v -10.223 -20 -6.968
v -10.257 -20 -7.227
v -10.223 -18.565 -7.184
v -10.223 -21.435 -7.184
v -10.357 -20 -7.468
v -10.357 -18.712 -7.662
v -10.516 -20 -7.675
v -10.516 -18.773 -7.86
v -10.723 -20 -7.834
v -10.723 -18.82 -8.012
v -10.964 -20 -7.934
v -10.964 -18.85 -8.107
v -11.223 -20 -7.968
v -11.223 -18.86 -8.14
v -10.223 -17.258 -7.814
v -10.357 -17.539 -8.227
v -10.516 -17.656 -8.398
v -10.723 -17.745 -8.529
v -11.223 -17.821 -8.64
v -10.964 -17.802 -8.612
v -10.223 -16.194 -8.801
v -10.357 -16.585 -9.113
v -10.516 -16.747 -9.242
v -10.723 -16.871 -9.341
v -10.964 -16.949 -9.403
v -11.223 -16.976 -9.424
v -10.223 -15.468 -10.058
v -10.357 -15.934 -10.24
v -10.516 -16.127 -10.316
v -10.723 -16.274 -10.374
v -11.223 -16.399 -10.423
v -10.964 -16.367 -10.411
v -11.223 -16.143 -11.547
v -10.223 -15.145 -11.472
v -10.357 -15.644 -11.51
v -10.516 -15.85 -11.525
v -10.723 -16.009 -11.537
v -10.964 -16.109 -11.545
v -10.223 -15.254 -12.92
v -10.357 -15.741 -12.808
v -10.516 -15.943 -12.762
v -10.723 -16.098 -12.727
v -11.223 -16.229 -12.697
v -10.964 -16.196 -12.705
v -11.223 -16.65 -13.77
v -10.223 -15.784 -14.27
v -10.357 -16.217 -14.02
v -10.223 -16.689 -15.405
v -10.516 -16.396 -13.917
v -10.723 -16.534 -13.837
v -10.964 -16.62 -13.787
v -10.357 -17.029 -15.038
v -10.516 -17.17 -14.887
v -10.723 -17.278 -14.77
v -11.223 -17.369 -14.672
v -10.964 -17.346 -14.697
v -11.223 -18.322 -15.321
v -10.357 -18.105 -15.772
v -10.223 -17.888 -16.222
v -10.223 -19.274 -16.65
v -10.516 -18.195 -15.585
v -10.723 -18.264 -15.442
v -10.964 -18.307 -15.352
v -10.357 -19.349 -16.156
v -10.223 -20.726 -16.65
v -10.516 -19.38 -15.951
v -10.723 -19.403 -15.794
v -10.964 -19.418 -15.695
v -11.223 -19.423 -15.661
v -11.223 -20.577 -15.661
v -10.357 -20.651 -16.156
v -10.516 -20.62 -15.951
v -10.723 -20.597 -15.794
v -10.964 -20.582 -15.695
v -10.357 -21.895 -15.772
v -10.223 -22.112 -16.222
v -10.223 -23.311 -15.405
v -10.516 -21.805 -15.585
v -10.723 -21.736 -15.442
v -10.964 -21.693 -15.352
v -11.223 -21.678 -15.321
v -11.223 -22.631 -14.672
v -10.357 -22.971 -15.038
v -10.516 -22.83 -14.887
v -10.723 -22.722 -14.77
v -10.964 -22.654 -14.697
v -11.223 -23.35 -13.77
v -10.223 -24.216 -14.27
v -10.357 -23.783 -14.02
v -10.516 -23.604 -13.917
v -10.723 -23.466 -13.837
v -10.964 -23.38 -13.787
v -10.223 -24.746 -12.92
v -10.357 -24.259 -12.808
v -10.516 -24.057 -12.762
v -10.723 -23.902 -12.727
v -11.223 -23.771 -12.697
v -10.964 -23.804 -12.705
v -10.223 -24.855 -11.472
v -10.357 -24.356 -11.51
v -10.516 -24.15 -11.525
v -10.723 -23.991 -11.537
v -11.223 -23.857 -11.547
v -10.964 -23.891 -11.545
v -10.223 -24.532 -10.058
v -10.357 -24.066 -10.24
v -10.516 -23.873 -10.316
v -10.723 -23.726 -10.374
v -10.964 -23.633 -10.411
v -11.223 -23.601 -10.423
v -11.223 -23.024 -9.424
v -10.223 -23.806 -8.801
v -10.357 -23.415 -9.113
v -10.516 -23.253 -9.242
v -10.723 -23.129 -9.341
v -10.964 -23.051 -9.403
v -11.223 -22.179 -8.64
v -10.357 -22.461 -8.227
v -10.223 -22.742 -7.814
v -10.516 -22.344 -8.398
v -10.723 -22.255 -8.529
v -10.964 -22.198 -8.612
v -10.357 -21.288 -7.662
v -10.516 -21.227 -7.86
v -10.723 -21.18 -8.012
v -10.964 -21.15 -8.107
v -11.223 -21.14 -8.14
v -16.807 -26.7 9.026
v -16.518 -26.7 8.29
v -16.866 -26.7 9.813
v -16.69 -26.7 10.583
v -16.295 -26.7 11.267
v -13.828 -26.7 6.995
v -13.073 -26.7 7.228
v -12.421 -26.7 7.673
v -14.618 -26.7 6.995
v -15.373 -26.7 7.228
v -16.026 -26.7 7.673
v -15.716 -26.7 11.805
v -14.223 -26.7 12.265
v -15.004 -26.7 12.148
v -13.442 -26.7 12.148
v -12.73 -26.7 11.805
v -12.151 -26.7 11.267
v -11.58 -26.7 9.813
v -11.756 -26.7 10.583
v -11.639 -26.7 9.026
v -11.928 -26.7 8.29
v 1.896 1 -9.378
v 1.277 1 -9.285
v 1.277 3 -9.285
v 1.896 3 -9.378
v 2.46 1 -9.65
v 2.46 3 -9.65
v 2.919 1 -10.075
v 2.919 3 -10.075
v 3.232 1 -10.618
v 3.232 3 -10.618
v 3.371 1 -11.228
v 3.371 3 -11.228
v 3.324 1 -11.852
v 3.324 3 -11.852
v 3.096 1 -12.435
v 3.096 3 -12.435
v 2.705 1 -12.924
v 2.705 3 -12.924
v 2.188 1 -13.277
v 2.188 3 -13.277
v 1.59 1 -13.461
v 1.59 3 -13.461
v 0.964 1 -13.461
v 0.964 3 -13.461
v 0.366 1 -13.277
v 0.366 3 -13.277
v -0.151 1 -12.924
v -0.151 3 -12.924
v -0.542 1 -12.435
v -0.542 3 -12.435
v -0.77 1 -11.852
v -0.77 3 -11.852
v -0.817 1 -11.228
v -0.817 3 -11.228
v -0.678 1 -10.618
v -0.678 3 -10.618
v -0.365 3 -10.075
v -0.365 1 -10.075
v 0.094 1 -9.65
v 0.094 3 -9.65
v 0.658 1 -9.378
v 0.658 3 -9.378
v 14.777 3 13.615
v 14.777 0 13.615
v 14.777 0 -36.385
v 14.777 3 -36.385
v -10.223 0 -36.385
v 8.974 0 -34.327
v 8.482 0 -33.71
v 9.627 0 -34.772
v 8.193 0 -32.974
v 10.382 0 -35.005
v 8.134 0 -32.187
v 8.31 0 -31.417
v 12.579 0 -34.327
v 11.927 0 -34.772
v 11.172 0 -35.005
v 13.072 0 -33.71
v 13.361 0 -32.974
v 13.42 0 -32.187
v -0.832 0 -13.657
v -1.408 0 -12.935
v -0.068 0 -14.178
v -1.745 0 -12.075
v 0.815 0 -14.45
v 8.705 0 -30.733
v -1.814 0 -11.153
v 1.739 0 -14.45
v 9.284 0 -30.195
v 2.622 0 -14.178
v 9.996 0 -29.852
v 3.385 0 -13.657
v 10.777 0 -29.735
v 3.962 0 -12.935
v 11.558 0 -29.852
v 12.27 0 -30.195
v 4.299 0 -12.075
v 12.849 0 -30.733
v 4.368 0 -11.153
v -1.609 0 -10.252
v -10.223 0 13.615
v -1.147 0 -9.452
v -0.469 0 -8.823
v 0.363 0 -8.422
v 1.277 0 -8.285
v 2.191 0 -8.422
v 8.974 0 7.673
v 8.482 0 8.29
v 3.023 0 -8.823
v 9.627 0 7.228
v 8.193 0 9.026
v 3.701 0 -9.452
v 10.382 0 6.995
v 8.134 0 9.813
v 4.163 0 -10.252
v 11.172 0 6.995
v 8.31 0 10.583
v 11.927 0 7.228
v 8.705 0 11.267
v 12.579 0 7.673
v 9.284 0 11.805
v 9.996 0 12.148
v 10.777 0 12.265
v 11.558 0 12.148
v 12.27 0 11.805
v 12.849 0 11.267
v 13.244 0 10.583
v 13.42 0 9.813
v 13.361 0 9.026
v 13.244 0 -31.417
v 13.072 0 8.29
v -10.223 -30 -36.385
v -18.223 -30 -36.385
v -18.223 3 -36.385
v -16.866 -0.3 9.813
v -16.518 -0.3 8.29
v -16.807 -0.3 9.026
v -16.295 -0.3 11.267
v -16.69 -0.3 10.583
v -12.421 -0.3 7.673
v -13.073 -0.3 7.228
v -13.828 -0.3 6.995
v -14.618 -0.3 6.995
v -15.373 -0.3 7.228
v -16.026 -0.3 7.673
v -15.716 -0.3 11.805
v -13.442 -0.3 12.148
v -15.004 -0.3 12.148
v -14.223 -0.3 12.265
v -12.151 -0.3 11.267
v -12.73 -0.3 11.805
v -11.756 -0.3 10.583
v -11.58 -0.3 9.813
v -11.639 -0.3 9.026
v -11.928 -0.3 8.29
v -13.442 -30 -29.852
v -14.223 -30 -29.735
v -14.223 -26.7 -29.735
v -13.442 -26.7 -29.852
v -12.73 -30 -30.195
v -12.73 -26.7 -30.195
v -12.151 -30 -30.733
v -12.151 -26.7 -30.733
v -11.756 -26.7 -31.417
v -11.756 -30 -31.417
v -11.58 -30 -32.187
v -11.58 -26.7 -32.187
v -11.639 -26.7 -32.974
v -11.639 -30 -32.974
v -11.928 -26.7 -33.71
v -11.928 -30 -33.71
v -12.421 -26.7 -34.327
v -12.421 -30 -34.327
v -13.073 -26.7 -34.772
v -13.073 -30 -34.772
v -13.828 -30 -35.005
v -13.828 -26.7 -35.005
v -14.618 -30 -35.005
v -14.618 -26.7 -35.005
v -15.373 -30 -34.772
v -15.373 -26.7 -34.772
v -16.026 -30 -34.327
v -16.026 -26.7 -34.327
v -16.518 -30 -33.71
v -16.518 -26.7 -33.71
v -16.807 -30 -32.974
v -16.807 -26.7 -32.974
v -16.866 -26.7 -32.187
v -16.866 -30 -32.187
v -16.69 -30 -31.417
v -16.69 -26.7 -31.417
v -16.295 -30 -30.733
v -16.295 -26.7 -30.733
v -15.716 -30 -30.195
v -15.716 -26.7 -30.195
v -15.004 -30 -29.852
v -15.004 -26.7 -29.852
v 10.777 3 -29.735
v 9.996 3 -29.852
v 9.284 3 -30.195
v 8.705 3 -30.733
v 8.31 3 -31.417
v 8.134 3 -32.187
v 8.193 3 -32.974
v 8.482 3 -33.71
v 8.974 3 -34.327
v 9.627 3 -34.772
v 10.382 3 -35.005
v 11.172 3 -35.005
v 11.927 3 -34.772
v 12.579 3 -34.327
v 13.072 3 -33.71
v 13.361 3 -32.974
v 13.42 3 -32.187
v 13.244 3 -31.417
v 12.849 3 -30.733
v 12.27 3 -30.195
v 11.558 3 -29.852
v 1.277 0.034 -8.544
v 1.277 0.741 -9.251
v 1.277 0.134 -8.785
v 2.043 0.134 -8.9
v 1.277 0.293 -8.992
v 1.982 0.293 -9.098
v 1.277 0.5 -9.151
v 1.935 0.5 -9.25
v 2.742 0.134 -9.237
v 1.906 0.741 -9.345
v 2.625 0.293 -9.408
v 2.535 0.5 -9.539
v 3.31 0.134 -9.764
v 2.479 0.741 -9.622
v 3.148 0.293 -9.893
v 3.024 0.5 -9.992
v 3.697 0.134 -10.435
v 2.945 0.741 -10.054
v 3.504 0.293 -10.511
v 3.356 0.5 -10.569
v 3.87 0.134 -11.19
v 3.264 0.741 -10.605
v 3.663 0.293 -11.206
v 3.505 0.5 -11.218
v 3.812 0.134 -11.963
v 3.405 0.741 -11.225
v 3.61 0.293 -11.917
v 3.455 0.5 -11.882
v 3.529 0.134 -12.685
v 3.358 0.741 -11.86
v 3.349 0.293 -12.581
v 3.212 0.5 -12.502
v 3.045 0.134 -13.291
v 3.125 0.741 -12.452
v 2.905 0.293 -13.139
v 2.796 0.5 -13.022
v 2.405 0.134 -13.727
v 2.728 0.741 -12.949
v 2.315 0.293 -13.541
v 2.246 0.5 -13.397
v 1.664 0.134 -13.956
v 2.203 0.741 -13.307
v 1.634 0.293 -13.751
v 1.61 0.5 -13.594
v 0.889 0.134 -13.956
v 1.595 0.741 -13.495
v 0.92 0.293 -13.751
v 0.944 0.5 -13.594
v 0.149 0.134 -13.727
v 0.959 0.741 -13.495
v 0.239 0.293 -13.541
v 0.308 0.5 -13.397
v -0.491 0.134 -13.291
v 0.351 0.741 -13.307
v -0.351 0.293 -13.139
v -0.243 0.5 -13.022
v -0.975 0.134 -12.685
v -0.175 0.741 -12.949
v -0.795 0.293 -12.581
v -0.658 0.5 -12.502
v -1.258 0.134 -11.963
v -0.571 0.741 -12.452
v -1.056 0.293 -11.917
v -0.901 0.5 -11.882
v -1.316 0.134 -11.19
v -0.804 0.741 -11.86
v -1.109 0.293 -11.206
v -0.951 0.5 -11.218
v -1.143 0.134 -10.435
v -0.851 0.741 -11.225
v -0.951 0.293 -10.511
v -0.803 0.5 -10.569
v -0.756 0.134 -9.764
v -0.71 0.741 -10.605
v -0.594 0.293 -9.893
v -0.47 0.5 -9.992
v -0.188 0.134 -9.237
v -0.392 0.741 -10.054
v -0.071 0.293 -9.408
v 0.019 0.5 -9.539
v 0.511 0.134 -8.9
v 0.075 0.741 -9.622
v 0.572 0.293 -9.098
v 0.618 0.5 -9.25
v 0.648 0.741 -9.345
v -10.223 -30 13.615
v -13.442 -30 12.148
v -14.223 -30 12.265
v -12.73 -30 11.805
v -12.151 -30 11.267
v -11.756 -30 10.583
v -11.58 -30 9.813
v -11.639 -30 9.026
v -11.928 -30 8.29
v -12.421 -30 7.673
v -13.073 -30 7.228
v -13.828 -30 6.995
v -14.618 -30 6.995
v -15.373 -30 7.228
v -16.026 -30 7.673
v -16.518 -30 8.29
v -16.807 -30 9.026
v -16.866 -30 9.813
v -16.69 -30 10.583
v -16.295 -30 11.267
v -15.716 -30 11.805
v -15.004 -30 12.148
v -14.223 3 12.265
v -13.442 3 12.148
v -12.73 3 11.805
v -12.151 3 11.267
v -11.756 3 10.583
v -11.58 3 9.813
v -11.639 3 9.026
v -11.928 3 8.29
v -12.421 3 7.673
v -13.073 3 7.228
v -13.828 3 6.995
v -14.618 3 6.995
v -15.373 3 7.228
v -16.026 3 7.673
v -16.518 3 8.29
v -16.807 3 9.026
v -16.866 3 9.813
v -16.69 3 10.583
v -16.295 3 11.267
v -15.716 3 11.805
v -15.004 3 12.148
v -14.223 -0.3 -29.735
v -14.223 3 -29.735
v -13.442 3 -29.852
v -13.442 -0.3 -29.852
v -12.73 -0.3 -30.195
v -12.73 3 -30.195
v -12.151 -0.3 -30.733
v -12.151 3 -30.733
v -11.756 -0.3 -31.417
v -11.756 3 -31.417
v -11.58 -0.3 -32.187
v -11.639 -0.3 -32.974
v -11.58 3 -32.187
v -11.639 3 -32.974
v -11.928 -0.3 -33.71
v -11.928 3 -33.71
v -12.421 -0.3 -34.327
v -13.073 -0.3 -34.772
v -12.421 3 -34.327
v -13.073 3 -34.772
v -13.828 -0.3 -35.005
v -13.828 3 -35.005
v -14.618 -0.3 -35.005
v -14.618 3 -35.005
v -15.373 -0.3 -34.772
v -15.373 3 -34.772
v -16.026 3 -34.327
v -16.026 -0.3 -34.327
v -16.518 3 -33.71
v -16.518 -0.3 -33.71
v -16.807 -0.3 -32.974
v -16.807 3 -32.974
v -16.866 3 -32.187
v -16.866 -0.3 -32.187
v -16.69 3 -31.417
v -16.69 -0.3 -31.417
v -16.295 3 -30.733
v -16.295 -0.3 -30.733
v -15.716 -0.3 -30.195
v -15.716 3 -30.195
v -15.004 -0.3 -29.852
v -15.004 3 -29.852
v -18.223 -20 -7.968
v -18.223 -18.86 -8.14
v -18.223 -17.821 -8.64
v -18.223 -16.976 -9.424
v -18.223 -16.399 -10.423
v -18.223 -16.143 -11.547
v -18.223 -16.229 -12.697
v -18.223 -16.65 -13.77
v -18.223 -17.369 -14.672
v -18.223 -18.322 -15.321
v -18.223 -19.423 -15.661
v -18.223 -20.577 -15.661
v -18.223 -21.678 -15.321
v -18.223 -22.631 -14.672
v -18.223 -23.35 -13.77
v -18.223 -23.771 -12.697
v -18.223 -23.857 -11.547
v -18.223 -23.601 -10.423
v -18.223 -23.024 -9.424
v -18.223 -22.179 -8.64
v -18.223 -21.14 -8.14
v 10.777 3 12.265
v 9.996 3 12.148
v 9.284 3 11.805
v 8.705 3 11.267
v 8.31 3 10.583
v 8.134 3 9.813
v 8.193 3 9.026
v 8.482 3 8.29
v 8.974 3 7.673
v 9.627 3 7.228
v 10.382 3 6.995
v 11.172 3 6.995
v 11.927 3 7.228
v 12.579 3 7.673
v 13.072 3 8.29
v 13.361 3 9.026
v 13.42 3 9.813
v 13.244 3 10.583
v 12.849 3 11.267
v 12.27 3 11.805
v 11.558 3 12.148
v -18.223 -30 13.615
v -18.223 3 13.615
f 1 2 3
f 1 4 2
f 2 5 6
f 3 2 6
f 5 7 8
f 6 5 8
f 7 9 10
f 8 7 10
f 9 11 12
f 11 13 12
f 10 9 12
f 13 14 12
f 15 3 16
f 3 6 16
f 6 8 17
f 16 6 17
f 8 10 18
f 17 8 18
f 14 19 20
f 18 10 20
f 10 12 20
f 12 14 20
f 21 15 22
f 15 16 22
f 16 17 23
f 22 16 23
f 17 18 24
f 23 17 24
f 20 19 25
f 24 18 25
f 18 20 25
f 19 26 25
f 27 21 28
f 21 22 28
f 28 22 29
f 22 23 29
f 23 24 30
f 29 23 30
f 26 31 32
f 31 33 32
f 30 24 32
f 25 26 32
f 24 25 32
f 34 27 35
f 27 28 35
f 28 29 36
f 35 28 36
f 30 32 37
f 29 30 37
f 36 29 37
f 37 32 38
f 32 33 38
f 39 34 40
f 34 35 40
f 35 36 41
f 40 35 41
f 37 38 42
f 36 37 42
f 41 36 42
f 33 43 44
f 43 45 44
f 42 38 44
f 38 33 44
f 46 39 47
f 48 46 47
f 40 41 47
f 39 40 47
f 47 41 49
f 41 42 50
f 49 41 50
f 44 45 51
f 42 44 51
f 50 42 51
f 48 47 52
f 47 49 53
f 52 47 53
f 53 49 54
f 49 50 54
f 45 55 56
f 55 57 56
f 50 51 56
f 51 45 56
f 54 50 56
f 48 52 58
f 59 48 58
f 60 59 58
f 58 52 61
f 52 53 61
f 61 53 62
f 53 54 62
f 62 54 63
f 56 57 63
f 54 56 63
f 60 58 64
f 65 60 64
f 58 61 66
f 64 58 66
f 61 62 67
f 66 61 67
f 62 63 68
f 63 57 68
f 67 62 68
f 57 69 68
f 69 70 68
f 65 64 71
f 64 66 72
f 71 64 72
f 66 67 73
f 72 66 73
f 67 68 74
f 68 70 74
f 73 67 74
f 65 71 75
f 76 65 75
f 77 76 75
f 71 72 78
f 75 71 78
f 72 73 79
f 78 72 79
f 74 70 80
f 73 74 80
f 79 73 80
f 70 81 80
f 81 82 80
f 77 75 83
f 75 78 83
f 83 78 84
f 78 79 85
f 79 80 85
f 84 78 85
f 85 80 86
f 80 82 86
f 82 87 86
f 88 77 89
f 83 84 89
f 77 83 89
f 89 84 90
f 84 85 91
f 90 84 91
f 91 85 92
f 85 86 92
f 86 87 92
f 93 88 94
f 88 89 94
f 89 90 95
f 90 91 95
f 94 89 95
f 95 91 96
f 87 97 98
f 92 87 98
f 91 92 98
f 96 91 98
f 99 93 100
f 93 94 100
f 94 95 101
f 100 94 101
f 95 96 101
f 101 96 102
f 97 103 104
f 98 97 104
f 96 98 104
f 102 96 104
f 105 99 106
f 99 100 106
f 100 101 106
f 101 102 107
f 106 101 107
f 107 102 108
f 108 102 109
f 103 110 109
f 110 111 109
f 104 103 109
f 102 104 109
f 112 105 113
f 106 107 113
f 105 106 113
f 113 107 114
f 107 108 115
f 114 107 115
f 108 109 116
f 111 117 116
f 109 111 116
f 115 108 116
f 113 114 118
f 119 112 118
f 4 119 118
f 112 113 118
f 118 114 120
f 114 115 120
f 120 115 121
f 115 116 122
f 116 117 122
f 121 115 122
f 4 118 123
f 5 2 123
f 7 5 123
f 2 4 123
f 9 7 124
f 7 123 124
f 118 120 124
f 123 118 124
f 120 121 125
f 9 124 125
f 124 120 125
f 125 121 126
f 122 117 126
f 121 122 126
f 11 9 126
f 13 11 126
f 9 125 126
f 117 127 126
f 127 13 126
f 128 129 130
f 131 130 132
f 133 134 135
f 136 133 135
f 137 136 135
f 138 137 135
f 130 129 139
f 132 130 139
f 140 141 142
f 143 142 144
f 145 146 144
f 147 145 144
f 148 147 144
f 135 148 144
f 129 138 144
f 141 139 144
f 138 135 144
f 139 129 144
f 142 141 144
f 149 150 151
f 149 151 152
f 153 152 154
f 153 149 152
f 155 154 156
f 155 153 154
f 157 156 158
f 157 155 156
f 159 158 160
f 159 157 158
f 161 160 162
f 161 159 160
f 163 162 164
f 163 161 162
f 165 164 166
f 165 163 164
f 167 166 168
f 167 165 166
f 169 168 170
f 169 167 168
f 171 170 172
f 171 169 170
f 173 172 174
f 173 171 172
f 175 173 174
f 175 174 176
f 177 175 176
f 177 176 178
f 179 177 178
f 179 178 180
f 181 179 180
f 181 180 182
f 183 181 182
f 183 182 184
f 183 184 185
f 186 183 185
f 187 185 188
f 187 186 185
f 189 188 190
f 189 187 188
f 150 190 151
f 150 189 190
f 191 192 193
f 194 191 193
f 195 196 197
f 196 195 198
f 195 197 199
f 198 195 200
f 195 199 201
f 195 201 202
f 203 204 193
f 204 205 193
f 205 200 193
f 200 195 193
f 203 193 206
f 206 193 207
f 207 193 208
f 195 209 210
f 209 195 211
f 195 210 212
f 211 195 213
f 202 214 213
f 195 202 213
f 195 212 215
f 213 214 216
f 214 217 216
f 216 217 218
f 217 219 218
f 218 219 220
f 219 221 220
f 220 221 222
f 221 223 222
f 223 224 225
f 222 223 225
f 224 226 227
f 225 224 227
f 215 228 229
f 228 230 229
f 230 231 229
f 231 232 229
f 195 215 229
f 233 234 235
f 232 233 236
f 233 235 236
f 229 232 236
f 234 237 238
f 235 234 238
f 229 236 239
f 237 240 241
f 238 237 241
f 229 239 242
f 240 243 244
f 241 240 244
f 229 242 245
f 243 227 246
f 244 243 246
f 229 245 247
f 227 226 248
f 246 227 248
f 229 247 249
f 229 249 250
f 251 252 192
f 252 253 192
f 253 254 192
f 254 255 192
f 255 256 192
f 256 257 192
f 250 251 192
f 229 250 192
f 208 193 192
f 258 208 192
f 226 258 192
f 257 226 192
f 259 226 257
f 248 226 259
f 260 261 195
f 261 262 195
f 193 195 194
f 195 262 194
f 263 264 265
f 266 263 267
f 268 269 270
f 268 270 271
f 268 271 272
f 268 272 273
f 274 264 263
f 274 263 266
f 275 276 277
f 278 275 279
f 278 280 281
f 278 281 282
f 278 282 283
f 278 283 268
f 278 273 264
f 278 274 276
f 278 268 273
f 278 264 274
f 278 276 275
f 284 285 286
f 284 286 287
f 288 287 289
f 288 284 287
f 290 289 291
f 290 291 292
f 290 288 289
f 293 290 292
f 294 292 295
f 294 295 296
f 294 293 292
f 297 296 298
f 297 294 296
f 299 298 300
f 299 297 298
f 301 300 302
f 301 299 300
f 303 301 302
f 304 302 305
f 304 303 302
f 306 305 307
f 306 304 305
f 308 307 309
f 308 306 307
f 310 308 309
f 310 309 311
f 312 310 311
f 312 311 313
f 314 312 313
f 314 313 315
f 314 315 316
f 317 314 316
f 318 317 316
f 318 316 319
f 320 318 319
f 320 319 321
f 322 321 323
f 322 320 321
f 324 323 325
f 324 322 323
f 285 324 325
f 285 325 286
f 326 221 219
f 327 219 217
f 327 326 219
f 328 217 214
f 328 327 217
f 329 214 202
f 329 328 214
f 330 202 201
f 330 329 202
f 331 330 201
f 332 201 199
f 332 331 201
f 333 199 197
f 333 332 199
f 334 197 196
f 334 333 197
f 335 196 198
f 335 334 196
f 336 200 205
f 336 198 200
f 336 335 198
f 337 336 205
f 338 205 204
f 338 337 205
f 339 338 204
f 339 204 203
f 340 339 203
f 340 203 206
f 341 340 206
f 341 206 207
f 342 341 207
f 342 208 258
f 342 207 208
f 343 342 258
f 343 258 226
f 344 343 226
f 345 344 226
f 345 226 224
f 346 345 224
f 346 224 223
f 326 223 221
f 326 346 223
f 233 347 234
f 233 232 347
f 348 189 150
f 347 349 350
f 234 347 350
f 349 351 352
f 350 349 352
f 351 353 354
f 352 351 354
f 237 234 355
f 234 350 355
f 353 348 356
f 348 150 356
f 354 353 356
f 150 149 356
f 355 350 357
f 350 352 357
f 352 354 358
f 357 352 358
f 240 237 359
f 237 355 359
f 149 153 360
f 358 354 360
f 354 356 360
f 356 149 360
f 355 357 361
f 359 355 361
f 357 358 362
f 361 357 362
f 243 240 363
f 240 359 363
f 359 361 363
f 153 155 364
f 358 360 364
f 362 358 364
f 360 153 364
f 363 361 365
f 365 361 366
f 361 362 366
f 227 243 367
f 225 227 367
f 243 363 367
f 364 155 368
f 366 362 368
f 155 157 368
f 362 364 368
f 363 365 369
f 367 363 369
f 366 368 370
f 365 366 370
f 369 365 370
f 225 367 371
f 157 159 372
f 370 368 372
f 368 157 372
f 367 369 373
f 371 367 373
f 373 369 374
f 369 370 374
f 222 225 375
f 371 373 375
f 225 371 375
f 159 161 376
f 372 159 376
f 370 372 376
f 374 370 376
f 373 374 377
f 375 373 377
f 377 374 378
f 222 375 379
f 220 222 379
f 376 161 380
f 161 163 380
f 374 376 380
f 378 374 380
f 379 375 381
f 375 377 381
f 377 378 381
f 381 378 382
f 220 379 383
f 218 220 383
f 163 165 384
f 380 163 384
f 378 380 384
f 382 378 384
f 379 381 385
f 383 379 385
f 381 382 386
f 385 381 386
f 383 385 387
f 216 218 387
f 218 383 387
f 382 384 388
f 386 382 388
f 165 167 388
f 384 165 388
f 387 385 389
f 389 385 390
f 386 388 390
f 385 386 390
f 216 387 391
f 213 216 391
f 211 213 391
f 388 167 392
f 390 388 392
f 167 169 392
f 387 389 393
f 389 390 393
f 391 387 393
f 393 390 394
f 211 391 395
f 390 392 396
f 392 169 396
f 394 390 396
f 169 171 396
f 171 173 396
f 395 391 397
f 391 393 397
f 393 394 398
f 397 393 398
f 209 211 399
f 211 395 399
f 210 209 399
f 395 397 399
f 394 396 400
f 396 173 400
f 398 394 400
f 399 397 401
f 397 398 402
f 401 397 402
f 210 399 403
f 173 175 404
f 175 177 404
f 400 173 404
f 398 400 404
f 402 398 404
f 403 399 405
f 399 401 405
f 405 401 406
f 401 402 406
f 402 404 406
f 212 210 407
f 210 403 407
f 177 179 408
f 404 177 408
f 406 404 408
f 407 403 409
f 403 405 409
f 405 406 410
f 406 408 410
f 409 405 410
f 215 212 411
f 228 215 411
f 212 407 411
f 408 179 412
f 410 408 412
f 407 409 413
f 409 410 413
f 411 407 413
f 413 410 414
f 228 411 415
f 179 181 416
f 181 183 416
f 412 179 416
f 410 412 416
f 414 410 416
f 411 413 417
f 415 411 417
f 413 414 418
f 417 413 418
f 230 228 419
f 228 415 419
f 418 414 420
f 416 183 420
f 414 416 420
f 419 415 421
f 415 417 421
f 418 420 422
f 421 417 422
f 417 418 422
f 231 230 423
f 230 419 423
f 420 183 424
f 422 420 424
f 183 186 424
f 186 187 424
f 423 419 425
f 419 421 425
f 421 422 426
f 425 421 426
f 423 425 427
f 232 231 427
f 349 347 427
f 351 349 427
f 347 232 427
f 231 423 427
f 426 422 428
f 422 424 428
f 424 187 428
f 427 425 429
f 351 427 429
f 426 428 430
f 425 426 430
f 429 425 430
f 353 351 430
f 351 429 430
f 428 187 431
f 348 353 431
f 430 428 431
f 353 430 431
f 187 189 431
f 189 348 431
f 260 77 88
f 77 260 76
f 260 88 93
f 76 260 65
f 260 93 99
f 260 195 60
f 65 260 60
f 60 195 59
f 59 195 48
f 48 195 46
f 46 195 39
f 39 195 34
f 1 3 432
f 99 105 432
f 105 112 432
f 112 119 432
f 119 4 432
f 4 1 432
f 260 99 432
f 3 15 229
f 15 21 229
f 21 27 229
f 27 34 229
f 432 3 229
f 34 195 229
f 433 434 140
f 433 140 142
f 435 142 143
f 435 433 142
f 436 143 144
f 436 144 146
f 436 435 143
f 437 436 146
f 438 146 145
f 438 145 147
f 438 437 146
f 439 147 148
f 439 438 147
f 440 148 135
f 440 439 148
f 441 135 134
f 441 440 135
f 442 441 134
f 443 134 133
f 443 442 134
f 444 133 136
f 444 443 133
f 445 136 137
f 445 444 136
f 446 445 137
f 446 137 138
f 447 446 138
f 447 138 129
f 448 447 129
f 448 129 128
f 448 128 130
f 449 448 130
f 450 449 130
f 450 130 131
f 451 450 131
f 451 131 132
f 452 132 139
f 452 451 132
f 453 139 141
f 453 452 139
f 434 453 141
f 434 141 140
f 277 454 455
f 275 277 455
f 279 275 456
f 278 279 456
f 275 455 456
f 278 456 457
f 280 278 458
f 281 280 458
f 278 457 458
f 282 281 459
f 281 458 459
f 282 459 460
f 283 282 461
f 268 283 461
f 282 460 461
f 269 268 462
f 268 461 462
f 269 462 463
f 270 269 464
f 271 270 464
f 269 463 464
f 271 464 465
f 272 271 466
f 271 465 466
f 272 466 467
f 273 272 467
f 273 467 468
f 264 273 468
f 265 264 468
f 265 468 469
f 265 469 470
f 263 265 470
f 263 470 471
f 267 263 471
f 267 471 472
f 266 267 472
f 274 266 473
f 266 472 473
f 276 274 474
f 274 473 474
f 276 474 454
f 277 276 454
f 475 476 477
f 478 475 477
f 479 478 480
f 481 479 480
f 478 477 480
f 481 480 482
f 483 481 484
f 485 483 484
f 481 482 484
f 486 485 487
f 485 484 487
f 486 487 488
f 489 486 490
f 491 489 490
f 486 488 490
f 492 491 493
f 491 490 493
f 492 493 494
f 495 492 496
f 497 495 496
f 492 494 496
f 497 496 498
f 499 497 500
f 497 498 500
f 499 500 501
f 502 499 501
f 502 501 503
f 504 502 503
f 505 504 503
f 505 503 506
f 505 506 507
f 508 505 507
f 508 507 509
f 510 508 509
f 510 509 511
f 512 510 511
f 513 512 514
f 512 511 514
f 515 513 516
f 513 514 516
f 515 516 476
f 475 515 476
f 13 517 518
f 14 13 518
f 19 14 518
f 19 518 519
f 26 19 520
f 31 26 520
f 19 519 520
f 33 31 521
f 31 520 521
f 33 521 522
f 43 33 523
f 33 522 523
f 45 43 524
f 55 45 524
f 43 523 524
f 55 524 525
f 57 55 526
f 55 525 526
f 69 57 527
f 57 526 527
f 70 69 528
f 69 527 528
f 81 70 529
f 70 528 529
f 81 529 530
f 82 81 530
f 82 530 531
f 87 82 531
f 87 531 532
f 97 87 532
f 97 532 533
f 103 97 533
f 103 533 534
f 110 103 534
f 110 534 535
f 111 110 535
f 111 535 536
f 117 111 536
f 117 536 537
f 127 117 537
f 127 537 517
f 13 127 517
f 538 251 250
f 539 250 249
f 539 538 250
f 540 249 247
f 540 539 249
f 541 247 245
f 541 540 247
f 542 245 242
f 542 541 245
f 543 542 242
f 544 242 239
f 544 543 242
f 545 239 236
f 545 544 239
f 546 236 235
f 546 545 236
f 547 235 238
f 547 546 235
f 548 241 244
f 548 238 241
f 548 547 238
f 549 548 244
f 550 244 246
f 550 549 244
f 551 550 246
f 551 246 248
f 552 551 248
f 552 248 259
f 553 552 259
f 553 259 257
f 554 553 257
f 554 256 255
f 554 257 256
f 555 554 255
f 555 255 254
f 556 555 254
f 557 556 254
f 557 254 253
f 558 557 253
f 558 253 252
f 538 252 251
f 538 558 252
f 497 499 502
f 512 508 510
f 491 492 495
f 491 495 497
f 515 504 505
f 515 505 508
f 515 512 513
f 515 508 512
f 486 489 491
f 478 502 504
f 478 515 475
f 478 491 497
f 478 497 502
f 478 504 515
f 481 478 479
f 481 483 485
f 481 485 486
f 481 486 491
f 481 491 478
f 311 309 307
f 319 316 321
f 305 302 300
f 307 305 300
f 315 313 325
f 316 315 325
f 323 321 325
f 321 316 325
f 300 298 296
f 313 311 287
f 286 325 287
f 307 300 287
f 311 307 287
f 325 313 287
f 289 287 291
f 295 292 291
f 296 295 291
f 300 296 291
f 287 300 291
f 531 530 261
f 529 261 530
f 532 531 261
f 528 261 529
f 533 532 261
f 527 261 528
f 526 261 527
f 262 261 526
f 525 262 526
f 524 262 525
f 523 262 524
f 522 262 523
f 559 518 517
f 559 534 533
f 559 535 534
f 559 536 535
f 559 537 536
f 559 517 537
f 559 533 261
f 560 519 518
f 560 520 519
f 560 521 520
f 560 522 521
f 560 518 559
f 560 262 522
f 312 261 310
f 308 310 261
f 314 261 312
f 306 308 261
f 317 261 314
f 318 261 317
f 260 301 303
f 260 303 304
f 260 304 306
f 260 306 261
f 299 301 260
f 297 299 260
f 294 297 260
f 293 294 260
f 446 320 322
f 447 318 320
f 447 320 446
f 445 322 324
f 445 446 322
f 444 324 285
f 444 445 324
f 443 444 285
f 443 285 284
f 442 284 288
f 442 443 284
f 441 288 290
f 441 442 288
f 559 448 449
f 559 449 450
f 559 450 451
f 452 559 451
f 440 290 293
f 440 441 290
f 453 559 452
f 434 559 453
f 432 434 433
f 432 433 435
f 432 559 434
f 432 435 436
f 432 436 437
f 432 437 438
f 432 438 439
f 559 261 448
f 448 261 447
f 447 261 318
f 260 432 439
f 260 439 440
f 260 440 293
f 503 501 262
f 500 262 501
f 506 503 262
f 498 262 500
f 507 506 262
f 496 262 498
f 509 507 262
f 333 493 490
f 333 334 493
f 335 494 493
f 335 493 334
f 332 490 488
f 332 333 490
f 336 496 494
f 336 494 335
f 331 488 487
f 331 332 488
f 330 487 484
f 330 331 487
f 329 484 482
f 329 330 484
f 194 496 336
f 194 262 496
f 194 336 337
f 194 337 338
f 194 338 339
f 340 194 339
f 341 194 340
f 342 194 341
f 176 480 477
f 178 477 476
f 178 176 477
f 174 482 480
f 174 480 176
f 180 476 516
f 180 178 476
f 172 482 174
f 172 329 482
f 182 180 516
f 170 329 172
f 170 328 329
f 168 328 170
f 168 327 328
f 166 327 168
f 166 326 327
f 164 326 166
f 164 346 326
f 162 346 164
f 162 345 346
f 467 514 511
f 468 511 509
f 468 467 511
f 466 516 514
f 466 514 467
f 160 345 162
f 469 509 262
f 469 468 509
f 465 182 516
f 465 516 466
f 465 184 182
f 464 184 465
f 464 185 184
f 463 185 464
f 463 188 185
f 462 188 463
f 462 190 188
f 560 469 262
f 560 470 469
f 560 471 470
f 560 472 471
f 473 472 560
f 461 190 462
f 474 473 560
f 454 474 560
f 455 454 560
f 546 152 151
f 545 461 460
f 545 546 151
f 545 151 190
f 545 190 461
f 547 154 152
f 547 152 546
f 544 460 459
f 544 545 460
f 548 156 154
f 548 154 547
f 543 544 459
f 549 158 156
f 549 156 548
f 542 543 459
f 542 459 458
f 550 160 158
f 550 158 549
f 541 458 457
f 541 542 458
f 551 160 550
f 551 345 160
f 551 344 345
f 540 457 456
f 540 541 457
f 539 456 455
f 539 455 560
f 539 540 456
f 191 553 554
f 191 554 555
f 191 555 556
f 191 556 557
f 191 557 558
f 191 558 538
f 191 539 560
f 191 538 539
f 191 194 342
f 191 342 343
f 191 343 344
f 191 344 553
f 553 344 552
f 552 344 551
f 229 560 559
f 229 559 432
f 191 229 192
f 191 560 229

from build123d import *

# Parameters (mm, degrees)
SKETCH1_W           = 25
SKETCH1_H           = 50
SKETCH1_R           = 2.1
BOSS_EXTRUDE1_DEPTH = 3
SKETCH2_W           = 50
SKETCH2_H           = 3
BOSS_EXTRUDE2_DEPTH = 8
SKETCH3_W           = 8
SKETCH3_H           = 50
BOSS_EXTRUDE3_DEPTH = 30
SKETCH4_R           = 2.65
CUT_EXTRUDE1_DEPTH  = 3.3
FILLET1_R           = 1
SKETCH5_R           = 3.868246804
CUT_EXTRUDE2_DEPTH  = 9
FILLET2_R           = 1


with BuildPart() as part:
    # Sketch1 → Boss-Extrude1 (new body)
    with BuildSketch(Plane(origin=(0, 0, 0), x_dir=(1, 0, 0), z_dir=(0, 1, 0))):
        with Locations((2.276951673, 11.384758364)):
            Rectangle(SKETCH1_W, SKETCH1_H)
        with Locations(Location((1.276951673, 11.384758364, 0), (0, 0, 270))):
            Circle(SKETCH1_R, mode=Mode.SUBTRACT)
    extrude(amount=BOSS_EXTRUDE1_DEPTH)

    # Sketch2 → Boss-Extrude2 (add)
    with BuildSketch(Plane.ZY.offset(10.223048327)):
        with Locations((-11.384758364, 1.5)):
            Rectangle(SKETCH2_W, SKETCH2_H)
    extrude(amount=BOSS_EXTRUDE2_DEPTH)

    # Sketch3 → Boss-Extrude3 (add)
    with BuildSketch(Plane.XZ):
        with Locations((-14.223048327, -11.384758364)):
            Rectangle(SKETCH3_W, SKETCH3_H)
    extrude(amount=BOSS_EXTRUDE3_DEPTH)

    # Sketch4 → Cut-Extrude1 (cut)
    with BuildSketch(Plane(origin=(0, 3, 0), x_dir=(1, 0, 0), z_dir=(0, 1, 0))):
        with Locations(Location((-14.223048327, 32.384758364, 0), (0, 0, 270))):
            Circle(SKETCH4_R)
        with Locations(Location((-14.223048327, -9.615241636, 0), (0, 0, 270))):
            Circle(SKETCH4_R)
    cut_extrude1 = extrude(amount=-CUT_EXTRUDE1_DEPTH, mode=Mode.SUBTRACT)

    # Mirror1: Cut-Extrude1 across plane
    add(cut_extrude1.mirror(Plane.ZX.offset(-13.5)), mode=Mode.SUBTRACT)

    # Fillet1
    fillet1_edges = [part.edges().sort_by_distance(p)[0] for p in [
        (1.276951673, 0, -13.484758364),
    ]]
    fillet(fillet1_edges, radius=FILLET1_R)

    # Sketch5 → Cut-Extrude2 (cut)
    with BuildSketch(Plane.ZY.offset(18.223048327)):
        with Locations((-11.836279124, -20)):
            Circle(SKETCH5_R)
    extrude(amount=-CUT_EXTRUDE2_DEPTH, mode=Mode.SUBTRACT)

    # Fillet2
    fillet2_edges = [part.edges().sort_by_distance(p)[0] for p in [
        (-10.223048327, -20, -15.704525928),
    ]]
    fillet(fillet2_edges, radius=FILLET2_R)

    # Mirror2: Cut-Extrude1 across plane
    add(cut_extrude1.mirror(Plane.ZY.offset(1.723048327)), mode=Mode.SUBTRACT)


solid = part.part
